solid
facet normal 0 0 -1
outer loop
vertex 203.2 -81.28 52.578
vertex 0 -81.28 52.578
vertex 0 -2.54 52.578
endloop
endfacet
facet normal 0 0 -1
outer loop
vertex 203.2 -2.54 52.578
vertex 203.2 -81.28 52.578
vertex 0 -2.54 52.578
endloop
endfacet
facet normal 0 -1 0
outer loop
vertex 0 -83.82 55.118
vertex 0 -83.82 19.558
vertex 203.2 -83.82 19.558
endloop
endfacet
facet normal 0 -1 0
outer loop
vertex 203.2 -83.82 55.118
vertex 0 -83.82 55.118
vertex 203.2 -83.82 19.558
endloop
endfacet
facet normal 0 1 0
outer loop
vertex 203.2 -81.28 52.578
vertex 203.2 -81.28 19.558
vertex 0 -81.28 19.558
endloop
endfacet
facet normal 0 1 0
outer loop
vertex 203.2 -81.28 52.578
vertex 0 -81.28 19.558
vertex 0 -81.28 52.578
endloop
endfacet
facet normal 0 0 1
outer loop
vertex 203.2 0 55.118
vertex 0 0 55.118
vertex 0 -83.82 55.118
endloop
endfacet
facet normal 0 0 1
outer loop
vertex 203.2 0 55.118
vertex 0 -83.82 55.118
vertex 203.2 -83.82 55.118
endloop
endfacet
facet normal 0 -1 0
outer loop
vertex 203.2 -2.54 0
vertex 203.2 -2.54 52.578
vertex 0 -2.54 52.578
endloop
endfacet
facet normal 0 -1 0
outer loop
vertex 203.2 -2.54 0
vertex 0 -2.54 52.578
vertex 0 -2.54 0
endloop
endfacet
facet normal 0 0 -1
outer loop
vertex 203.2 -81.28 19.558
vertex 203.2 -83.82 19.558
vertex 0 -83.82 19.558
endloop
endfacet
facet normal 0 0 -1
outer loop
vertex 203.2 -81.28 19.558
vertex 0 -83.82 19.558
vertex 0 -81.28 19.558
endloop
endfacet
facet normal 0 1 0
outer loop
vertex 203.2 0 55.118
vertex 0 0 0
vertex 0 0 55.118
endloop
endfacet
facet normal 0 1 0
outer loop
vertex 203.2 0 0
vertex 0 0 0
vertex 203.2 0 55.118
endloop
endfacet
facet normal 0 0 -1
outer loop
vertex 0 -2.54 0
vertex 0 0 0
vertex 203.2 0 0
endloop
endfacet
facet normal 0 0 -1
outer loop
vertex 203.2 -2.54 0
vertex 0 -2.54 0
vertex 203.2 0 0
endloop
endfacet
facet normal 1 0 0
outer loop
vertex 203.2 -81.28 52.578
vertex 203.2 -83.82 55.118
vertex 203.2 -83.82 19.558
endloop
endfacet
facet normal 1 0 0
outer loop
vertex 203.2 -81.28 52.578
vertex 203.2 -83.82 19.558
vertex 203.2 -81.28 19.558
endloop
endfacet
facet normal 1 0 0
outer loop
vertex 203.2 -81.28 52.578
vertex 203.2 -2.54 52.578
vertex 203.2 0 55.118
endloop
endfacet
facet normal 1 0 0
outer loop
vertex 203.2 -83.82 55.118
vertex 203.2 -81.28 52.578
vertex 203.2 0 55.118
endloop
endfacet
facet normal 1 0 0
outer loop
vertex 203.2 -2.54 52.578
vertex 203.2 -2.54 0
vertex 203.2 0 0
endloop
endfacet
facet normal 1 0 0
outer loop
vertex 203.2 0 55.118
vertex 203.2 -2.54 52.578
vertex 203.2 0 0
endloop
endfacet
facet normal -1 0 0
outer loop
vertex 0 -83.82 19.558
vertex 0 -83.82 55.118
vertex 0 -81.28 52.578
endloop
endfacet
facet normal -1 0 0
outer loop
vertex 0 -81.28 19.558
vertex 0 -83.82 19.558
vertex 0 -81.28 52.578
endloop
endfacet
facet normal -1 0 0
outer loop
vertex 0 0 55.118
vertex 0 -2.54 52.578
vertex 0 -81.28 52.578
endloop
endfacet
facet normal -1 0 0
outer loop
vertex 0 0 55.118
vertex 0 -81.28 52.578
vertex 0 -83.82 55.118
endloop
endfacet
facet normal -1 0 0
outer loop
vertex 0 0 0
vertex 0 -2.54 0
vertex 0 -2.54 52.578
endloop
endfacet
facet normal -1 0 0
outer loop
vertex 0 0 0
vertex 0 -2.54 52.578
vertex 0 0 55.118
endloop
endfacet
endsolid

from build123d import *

# Parameters (mm, degrees)
SKETCH1_W           = 203.2
SKETCH1_H           = 83.82
BOSS_EXTRUDE1_DEPTH = 55.118
CUT_EXTRUDE1_DEPTH  = 227.614267697


with BuildPart() as part:
    # Sketch1 → Boss-Extrude1 (new body)
    with BuildSketch(Plane.XY):
        with Locations((101.6, -41.91)):
            Rectangle(SKETCH1_W, SKETCH1_H)
    extrude(amount=BOSS_EXTRUDE1_DEPTH)

    # Sketch2 → Cut-Extrude1 (cut, through all)
    with BuildSketch(Plane(origin=(203.2, 0, 0), x_dir=(0, 0, -1), z_dir=(1, 0, 0))):
        Polygon((-19.558, -83.82), (-19.558, -81.28), (-52.578, -81.28), (-52.578, -2.54), (0, -2.54), (0, -83.82), align=None)
    extrude(amount=-CUT_EXTRUDE1_DEPTH, mode=Mode.SUBTRACT)


solid = part.part
